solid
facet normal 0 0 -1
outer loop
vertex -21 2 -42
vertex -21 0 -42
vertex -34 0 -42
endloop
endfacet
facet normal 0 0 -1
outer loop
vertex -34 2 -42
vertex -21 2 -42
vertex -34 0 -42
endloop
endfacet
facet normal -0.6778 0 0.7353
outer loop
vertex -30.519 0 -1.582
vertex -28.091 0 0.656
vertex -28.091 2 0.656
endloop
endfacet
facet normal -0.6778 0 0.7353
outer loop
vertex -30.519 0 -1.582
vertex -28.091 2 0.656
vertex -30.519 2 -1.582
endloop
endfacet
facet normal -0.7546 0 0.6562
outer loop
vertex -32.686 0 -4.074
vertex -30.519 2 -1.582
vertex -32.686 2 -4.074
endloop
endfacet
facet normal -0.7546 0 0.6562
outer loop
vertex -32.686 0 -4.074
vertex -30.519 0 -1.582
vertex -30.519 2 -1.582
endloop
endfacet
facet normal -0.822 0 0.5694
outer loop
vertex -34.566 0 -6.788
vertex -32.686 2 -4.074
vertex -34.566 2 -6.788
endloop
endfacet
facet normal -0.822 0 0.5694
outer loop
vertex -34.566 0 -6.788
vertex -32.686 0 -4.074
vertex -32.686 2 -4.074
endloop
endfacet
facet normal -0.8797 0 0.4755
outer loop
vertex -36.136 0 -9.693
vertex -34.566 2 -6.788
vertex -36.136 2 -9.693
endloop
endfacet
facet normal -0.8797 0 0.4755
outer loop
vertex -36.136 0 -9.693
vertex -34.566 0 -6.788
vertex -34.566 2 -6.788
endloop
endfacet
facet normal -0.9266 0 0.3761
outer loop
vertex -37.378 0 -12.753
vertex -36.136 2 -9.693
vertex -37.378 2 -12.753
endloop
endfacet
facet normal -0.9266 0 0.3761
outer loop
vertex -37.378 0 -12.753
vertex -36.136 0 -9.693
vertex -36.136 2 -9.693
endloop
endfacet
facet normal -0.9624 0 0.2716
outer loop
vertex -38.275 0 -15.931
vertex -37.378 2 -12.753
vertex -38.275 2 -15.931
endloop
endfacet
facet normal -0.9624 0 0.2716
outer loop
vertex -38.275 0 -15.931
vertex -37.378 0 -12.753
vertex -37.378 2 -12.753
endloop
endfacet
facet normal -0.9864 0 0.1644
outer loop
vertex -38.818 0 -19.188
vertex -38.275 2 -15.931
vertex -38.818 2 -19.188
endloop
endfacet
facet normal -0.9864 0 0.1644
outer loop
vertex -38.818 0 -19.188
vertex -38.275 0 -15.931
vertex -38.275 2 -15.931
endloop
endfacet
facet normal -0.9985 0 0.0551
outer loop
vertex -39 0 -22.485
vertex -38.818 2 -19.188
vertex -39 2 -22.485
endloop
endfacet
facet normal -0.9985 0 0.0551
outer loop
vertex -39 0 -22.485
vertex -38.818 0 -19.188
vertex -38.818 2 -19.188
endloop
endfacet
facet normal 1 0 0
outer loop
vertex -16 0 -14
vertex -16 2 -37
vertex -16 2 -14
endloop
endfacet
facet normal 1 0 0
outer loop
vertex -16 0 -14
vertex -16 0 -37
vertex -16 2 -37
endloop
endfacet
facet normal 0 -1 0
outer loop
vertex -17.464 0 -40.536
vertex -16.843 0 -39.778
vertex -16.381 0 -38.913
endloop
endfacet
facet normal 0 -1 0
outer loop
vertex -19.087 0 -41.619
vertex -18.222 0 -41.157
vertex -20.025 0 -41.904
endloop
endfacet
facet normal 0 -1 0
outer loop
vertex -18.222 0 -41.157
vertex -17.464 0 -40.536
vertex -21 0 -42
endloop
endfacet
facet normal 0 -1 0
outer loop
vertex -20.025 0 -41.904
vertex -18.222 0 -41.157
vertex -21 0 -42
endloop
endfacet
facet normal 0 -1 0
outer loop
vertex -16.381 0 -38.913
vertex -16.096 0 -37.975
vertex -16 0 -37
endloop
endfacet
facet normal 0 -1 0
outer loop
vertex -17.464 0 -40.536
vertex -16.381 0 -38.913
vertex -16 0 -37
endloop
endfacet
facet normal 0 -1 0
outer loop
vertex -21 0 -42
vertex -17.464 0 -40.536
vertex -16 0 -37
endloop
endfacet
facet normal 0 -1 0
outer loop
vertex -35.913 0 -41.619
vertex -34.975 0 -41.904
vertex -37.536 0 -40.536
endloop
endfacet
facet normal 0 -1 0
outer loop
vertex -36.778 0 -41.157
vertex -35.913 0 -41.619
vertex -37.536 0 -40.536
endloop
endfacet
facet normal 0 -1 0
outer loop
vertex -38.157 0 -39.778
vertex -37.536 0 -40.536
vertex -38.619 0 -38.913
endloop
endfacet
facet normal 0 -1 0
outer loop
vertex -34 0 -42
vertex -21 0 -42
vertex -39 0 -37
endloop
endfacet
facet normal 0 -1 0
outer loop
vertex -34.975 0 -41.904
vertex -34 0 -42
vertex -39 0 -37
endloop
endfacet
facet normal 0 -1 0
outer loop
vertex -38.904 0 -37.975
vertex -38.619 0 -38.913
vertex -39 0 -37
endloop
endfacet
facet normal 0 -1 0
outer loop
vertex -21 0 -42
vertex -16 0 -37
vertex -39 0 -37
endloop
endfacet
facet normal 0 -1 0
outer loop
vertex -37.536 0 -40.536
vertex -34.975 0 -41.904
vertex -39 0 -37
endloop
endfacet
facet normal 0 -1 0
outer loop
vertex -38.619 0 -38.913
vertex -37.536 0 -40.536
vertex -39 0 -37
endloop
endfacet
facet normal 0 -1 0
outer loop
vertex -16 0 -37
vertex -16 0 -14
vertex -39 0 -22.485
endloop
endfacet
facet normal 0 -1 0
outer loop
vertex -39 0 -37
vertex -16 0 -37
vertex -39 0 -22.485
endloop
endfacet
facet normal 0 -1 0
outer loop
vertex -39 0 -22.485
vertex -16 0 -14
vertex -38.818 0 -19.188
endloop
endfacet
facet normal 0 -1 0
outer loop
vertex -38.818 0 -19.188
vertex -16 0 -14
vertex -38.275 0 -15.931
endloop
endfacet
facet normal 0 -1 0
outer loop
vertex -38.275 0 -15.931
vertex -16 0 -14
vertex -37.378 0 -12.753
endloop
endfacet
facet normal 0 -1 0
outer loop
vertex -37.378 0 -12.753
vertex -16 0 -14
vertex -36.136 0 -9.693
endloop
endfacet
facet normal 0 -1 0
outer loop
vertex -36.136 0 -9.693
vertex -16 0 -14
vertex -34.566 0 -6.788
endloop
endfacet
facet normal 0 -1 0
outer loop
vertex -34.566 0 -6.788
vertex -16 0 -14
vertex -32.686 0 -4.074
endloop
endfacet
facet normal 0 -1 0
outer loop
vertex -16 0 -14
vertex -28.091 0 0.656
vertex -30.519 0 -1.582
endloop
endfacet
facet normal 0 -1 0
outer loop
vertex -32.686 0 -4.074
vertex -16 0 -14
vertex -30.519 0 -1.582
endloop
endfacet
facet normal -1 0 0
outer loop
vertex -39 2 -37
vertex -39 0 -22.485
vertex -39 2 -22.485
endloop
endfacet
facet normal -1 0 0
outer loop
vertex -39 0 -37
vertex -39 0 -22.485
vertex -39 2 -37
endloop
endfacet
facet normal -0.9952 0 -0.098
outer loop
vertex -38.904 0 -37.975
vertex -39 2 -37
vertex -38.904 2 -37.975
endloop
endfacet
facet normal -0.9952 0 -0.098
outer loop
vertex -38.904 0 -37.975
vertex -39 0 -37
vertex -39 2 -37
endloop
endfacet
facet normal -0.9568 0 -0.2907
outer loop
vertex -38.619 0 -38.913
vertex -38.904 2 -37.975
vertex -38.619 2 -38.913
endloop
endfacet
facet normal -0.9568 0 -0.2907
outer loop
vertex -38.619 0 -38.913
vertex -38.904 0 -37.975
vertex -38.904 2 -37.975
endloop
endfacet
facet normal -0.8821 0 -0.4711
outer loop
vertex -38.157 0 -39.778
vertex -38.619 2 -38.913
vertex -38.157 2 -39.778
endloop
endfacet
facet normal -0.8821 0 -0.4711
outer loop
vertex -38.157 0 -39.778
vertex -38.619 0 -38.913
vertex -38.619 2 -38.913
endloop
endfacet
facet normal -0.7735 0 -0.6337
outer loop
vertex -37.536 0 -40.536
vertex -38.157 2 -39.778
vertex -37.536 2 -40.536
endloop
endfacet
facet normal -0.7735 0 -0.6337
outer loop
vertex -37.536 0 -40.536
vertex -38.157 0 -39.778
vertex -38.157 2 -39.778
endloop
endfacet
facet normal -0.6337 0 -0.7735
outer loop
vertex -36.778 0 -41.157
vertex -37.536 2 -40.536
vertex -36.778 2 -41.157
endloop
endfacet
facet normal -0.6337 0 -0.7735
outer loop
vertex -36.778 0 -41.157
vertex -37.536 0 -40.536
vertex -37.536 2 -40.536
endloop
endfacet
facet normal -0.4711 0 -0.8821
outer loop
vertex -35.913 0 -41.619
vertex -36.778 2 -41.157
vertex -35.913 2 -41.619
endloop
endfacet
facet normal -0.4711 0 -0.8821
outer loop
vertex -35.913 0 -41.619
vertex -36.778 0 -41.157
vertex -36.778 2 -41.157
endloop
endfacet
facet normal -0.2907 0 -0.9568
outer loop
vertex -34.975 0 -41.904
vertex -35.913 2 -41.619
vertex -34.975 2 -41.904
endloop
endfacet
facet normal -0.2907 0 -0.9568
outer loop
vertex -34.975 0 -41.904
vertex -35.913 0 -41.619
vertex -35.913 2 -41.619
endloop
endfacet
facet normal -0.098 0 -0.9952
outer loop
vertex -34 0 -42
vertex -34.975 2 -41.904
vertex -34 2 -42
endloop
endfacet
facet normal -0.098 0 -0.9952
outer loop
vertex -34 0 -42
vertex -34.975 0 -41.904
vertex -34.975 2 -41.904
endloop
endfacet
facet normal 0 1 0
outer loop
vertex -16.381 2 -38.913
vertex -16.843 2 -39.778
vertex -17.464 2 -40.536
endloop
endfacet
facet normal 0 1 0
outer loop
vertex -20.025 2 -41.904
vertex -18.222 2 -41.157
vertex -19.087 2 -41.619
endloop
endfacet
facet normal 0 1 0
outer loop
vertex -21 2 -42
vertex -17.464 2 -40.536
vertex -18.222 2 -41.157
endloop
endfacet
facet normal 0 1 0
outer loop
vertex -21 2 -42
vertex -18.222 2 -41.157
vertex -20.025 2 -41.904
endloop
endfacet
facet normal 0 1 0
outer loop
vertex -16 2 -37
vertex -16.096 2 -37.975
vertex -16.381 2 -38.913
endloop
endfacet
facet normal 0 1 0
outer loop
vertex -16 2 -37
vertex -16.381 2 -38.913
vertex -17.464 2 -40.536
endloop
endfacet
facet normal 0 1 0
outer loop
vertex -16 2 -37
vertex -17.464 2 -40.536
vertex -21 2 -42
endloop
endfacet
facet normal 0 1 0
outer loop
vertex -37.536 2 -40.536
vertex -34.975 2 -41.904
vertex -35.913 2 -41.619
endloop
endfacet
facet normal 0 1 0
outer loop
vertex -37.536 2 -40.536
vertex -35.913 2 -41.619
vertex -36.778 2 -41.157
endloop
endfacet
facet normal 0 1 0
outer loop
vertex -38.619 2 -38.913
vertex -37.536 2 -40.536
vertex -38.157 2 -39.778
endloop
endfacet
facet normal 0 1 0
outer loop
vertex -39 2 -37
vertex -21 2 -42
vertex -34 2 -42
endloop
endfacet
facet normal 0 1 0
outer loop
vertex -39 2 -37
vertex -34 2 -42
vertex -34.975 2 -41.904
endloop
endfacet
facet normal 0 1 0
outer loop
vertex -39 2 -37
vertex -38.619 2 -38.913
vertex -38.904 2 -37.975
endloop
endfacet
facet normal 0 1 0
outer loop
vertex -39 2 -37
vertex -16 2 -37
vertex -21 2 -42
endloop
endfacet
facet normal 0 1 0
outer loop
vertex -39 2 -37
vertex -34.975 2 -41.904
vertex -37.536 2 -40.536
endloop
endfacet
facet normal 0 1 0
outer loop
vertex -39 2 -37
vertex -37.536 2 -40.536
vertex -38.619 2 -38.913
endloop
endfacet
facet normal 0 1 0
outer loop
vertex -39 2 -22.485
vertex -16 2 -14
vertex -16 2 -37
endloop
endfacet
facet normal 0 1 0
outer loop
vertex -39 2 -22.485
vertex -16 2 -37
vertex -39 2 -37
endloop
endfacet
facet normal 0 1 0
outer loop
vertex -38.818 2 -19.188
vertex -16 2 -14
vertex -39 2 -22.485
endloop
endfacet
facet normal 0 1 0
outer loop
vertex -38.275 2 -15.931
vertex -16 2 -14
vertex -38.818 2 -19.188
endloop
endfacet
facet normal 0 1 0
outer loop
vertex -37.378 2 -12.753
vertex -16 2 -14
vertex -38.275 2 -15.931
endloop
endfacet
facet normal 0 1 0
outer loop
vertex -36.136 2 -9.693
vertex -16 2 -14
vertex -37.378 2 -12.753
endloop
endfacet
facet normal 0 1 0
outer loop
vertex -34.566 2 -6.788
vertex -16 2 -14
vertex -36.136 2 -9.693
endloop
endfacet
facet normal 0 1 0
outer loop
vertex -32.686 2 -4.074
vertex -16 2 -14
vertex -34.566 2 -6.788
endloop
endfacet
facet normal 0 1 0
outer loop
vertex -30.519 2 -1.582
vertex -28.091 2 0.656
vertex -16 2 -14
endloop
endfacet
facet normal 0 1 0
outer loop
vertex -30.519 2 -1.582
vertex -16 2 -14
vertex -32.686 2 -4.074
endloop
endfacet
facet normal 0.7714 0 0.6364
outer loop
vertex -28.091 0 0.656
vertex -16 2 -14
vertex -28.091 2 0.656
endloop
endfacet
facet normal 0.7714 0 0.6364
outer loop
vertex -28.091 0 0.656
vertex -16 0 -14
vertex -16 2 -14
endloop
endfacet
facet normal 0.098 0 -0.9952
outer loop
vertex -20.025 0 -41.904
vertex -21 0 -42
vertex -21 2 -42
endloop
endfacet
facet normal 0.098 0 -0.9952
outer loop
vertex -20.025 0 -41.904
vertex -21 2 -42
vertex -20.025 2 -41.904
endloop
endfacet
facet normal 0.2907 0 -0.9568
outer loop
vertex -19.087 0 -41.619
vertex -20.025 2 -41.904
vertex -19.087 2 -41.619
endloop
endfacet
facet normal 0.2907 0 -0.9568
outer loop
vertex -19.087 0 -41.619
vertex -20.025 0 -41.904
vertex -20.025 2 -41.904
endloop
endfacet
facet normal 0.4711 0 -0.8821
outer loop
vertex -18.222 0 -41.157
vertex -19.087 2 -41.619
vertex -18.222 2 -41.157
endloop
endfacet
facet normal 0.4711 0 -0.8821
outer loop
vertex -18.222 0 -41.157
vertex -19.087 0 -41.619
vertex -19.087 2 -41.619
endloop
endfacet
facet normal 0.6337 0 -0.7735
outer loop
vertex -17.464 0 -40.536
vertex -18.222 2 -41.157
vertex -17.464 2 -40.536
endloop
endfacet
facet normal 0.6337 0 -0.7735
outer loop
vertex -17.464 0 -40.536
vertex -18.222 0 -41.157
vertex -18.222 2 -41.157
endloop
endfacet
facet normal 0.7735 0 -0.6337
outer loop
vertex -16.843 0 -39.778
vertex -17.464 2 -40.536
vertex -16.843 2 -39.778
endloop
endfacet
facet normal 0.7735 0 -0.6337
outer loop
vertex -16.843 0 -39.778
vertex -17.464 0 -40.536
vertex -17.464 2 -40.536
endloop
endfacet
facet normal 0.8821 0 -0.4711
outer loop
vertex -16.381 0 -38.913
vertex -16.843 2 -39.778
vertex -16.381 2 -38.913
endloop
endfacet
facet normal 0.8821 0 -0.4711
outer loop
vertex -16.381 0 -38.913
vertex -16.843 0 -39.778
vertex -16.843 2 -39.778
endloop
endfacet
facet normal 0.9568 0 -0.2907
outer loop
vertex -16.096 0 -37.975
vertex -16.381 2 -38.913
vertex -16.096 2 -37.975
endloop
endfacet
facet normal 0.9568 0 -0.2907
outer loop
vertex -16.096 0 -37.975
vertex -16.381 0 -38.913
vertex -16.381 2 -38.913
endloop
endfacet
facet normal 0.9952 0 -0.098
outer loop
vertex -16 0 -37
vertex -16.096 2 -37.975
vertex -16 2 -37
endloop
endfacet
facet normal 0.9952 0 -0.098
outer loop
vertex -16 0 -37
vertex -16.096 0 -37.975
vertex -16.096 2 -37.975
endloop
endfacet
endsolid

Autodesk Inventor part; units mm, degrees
ref_plane "YZ Plane" through (0, 0, 0) normal (1, 0, 0) x (0, 1, 0)
ref_plane "XZ Plane" through (0, 0, 0) normal (0, 1, 0) x (-1, 0, 0)
ref_plane "XY Plane" through (0, 0, 0) normal (0, 0, 1) x (1, 0, 0)
sketch "Sketch1" plane through (0, 0, 0) normal (0, 1, 0) x (-1, 0, 0)
  circle A0 centre (0, 0) radius 12 construction
  line L0 (0, 0) -> (0, -50) construction
  line L1 (20, -50) -> (34, -50) construction
  line L2 (34, -50) -> (34, -16) construction
  line L3 (34, -16) -> (20, -16) construction
  line L4 (20, -16) -> (20, -50) construction
  line L5 (21, -42) -> (34, -42)
  circle A1 centre (0, 0) radius 6 construction
  line L6 (16, -14) -> (28.0909, 0.6564)
  line L7 (39, -22.4853) -> (39, -37)
  line L8 (16, -37) -> (16, -14)
  arc A2 (16, -14) -> (0, -6) centre (0, -26) ccw construction
  arc A3 (39, -22.4853) -> (28.0909, 0.6564) centre (9, -22.4853) ccw
  arc A4 (34, -42) -> (39, -37) centre (34, -37) ccw
  arc A5 (16, -37) -> (21, -42) centre (21, -37) ccw
  point P0 (16, -42)
  point P1 (39, -42)
  dimension "d26" = 12
  dimension "d0" = 50
  dimension "d1" = 24
  dimension "d16" = 16
  dimension "d17" = 34
  dimension "d18" = 23
  dimension "d19" = 26
  dimension "d21" = 5
  dimension "d23" = 20
  dimension "d25" = 16
  dimension "d27" = 30
  dimension "d28" = 19
  dimension "d30" = 5
  dimension "d31" = 5
  dimension "d32" = 20
extrude "Extrusion1" add sketch "Sketch1" along normal blind 2
properties part number "flange_small"
